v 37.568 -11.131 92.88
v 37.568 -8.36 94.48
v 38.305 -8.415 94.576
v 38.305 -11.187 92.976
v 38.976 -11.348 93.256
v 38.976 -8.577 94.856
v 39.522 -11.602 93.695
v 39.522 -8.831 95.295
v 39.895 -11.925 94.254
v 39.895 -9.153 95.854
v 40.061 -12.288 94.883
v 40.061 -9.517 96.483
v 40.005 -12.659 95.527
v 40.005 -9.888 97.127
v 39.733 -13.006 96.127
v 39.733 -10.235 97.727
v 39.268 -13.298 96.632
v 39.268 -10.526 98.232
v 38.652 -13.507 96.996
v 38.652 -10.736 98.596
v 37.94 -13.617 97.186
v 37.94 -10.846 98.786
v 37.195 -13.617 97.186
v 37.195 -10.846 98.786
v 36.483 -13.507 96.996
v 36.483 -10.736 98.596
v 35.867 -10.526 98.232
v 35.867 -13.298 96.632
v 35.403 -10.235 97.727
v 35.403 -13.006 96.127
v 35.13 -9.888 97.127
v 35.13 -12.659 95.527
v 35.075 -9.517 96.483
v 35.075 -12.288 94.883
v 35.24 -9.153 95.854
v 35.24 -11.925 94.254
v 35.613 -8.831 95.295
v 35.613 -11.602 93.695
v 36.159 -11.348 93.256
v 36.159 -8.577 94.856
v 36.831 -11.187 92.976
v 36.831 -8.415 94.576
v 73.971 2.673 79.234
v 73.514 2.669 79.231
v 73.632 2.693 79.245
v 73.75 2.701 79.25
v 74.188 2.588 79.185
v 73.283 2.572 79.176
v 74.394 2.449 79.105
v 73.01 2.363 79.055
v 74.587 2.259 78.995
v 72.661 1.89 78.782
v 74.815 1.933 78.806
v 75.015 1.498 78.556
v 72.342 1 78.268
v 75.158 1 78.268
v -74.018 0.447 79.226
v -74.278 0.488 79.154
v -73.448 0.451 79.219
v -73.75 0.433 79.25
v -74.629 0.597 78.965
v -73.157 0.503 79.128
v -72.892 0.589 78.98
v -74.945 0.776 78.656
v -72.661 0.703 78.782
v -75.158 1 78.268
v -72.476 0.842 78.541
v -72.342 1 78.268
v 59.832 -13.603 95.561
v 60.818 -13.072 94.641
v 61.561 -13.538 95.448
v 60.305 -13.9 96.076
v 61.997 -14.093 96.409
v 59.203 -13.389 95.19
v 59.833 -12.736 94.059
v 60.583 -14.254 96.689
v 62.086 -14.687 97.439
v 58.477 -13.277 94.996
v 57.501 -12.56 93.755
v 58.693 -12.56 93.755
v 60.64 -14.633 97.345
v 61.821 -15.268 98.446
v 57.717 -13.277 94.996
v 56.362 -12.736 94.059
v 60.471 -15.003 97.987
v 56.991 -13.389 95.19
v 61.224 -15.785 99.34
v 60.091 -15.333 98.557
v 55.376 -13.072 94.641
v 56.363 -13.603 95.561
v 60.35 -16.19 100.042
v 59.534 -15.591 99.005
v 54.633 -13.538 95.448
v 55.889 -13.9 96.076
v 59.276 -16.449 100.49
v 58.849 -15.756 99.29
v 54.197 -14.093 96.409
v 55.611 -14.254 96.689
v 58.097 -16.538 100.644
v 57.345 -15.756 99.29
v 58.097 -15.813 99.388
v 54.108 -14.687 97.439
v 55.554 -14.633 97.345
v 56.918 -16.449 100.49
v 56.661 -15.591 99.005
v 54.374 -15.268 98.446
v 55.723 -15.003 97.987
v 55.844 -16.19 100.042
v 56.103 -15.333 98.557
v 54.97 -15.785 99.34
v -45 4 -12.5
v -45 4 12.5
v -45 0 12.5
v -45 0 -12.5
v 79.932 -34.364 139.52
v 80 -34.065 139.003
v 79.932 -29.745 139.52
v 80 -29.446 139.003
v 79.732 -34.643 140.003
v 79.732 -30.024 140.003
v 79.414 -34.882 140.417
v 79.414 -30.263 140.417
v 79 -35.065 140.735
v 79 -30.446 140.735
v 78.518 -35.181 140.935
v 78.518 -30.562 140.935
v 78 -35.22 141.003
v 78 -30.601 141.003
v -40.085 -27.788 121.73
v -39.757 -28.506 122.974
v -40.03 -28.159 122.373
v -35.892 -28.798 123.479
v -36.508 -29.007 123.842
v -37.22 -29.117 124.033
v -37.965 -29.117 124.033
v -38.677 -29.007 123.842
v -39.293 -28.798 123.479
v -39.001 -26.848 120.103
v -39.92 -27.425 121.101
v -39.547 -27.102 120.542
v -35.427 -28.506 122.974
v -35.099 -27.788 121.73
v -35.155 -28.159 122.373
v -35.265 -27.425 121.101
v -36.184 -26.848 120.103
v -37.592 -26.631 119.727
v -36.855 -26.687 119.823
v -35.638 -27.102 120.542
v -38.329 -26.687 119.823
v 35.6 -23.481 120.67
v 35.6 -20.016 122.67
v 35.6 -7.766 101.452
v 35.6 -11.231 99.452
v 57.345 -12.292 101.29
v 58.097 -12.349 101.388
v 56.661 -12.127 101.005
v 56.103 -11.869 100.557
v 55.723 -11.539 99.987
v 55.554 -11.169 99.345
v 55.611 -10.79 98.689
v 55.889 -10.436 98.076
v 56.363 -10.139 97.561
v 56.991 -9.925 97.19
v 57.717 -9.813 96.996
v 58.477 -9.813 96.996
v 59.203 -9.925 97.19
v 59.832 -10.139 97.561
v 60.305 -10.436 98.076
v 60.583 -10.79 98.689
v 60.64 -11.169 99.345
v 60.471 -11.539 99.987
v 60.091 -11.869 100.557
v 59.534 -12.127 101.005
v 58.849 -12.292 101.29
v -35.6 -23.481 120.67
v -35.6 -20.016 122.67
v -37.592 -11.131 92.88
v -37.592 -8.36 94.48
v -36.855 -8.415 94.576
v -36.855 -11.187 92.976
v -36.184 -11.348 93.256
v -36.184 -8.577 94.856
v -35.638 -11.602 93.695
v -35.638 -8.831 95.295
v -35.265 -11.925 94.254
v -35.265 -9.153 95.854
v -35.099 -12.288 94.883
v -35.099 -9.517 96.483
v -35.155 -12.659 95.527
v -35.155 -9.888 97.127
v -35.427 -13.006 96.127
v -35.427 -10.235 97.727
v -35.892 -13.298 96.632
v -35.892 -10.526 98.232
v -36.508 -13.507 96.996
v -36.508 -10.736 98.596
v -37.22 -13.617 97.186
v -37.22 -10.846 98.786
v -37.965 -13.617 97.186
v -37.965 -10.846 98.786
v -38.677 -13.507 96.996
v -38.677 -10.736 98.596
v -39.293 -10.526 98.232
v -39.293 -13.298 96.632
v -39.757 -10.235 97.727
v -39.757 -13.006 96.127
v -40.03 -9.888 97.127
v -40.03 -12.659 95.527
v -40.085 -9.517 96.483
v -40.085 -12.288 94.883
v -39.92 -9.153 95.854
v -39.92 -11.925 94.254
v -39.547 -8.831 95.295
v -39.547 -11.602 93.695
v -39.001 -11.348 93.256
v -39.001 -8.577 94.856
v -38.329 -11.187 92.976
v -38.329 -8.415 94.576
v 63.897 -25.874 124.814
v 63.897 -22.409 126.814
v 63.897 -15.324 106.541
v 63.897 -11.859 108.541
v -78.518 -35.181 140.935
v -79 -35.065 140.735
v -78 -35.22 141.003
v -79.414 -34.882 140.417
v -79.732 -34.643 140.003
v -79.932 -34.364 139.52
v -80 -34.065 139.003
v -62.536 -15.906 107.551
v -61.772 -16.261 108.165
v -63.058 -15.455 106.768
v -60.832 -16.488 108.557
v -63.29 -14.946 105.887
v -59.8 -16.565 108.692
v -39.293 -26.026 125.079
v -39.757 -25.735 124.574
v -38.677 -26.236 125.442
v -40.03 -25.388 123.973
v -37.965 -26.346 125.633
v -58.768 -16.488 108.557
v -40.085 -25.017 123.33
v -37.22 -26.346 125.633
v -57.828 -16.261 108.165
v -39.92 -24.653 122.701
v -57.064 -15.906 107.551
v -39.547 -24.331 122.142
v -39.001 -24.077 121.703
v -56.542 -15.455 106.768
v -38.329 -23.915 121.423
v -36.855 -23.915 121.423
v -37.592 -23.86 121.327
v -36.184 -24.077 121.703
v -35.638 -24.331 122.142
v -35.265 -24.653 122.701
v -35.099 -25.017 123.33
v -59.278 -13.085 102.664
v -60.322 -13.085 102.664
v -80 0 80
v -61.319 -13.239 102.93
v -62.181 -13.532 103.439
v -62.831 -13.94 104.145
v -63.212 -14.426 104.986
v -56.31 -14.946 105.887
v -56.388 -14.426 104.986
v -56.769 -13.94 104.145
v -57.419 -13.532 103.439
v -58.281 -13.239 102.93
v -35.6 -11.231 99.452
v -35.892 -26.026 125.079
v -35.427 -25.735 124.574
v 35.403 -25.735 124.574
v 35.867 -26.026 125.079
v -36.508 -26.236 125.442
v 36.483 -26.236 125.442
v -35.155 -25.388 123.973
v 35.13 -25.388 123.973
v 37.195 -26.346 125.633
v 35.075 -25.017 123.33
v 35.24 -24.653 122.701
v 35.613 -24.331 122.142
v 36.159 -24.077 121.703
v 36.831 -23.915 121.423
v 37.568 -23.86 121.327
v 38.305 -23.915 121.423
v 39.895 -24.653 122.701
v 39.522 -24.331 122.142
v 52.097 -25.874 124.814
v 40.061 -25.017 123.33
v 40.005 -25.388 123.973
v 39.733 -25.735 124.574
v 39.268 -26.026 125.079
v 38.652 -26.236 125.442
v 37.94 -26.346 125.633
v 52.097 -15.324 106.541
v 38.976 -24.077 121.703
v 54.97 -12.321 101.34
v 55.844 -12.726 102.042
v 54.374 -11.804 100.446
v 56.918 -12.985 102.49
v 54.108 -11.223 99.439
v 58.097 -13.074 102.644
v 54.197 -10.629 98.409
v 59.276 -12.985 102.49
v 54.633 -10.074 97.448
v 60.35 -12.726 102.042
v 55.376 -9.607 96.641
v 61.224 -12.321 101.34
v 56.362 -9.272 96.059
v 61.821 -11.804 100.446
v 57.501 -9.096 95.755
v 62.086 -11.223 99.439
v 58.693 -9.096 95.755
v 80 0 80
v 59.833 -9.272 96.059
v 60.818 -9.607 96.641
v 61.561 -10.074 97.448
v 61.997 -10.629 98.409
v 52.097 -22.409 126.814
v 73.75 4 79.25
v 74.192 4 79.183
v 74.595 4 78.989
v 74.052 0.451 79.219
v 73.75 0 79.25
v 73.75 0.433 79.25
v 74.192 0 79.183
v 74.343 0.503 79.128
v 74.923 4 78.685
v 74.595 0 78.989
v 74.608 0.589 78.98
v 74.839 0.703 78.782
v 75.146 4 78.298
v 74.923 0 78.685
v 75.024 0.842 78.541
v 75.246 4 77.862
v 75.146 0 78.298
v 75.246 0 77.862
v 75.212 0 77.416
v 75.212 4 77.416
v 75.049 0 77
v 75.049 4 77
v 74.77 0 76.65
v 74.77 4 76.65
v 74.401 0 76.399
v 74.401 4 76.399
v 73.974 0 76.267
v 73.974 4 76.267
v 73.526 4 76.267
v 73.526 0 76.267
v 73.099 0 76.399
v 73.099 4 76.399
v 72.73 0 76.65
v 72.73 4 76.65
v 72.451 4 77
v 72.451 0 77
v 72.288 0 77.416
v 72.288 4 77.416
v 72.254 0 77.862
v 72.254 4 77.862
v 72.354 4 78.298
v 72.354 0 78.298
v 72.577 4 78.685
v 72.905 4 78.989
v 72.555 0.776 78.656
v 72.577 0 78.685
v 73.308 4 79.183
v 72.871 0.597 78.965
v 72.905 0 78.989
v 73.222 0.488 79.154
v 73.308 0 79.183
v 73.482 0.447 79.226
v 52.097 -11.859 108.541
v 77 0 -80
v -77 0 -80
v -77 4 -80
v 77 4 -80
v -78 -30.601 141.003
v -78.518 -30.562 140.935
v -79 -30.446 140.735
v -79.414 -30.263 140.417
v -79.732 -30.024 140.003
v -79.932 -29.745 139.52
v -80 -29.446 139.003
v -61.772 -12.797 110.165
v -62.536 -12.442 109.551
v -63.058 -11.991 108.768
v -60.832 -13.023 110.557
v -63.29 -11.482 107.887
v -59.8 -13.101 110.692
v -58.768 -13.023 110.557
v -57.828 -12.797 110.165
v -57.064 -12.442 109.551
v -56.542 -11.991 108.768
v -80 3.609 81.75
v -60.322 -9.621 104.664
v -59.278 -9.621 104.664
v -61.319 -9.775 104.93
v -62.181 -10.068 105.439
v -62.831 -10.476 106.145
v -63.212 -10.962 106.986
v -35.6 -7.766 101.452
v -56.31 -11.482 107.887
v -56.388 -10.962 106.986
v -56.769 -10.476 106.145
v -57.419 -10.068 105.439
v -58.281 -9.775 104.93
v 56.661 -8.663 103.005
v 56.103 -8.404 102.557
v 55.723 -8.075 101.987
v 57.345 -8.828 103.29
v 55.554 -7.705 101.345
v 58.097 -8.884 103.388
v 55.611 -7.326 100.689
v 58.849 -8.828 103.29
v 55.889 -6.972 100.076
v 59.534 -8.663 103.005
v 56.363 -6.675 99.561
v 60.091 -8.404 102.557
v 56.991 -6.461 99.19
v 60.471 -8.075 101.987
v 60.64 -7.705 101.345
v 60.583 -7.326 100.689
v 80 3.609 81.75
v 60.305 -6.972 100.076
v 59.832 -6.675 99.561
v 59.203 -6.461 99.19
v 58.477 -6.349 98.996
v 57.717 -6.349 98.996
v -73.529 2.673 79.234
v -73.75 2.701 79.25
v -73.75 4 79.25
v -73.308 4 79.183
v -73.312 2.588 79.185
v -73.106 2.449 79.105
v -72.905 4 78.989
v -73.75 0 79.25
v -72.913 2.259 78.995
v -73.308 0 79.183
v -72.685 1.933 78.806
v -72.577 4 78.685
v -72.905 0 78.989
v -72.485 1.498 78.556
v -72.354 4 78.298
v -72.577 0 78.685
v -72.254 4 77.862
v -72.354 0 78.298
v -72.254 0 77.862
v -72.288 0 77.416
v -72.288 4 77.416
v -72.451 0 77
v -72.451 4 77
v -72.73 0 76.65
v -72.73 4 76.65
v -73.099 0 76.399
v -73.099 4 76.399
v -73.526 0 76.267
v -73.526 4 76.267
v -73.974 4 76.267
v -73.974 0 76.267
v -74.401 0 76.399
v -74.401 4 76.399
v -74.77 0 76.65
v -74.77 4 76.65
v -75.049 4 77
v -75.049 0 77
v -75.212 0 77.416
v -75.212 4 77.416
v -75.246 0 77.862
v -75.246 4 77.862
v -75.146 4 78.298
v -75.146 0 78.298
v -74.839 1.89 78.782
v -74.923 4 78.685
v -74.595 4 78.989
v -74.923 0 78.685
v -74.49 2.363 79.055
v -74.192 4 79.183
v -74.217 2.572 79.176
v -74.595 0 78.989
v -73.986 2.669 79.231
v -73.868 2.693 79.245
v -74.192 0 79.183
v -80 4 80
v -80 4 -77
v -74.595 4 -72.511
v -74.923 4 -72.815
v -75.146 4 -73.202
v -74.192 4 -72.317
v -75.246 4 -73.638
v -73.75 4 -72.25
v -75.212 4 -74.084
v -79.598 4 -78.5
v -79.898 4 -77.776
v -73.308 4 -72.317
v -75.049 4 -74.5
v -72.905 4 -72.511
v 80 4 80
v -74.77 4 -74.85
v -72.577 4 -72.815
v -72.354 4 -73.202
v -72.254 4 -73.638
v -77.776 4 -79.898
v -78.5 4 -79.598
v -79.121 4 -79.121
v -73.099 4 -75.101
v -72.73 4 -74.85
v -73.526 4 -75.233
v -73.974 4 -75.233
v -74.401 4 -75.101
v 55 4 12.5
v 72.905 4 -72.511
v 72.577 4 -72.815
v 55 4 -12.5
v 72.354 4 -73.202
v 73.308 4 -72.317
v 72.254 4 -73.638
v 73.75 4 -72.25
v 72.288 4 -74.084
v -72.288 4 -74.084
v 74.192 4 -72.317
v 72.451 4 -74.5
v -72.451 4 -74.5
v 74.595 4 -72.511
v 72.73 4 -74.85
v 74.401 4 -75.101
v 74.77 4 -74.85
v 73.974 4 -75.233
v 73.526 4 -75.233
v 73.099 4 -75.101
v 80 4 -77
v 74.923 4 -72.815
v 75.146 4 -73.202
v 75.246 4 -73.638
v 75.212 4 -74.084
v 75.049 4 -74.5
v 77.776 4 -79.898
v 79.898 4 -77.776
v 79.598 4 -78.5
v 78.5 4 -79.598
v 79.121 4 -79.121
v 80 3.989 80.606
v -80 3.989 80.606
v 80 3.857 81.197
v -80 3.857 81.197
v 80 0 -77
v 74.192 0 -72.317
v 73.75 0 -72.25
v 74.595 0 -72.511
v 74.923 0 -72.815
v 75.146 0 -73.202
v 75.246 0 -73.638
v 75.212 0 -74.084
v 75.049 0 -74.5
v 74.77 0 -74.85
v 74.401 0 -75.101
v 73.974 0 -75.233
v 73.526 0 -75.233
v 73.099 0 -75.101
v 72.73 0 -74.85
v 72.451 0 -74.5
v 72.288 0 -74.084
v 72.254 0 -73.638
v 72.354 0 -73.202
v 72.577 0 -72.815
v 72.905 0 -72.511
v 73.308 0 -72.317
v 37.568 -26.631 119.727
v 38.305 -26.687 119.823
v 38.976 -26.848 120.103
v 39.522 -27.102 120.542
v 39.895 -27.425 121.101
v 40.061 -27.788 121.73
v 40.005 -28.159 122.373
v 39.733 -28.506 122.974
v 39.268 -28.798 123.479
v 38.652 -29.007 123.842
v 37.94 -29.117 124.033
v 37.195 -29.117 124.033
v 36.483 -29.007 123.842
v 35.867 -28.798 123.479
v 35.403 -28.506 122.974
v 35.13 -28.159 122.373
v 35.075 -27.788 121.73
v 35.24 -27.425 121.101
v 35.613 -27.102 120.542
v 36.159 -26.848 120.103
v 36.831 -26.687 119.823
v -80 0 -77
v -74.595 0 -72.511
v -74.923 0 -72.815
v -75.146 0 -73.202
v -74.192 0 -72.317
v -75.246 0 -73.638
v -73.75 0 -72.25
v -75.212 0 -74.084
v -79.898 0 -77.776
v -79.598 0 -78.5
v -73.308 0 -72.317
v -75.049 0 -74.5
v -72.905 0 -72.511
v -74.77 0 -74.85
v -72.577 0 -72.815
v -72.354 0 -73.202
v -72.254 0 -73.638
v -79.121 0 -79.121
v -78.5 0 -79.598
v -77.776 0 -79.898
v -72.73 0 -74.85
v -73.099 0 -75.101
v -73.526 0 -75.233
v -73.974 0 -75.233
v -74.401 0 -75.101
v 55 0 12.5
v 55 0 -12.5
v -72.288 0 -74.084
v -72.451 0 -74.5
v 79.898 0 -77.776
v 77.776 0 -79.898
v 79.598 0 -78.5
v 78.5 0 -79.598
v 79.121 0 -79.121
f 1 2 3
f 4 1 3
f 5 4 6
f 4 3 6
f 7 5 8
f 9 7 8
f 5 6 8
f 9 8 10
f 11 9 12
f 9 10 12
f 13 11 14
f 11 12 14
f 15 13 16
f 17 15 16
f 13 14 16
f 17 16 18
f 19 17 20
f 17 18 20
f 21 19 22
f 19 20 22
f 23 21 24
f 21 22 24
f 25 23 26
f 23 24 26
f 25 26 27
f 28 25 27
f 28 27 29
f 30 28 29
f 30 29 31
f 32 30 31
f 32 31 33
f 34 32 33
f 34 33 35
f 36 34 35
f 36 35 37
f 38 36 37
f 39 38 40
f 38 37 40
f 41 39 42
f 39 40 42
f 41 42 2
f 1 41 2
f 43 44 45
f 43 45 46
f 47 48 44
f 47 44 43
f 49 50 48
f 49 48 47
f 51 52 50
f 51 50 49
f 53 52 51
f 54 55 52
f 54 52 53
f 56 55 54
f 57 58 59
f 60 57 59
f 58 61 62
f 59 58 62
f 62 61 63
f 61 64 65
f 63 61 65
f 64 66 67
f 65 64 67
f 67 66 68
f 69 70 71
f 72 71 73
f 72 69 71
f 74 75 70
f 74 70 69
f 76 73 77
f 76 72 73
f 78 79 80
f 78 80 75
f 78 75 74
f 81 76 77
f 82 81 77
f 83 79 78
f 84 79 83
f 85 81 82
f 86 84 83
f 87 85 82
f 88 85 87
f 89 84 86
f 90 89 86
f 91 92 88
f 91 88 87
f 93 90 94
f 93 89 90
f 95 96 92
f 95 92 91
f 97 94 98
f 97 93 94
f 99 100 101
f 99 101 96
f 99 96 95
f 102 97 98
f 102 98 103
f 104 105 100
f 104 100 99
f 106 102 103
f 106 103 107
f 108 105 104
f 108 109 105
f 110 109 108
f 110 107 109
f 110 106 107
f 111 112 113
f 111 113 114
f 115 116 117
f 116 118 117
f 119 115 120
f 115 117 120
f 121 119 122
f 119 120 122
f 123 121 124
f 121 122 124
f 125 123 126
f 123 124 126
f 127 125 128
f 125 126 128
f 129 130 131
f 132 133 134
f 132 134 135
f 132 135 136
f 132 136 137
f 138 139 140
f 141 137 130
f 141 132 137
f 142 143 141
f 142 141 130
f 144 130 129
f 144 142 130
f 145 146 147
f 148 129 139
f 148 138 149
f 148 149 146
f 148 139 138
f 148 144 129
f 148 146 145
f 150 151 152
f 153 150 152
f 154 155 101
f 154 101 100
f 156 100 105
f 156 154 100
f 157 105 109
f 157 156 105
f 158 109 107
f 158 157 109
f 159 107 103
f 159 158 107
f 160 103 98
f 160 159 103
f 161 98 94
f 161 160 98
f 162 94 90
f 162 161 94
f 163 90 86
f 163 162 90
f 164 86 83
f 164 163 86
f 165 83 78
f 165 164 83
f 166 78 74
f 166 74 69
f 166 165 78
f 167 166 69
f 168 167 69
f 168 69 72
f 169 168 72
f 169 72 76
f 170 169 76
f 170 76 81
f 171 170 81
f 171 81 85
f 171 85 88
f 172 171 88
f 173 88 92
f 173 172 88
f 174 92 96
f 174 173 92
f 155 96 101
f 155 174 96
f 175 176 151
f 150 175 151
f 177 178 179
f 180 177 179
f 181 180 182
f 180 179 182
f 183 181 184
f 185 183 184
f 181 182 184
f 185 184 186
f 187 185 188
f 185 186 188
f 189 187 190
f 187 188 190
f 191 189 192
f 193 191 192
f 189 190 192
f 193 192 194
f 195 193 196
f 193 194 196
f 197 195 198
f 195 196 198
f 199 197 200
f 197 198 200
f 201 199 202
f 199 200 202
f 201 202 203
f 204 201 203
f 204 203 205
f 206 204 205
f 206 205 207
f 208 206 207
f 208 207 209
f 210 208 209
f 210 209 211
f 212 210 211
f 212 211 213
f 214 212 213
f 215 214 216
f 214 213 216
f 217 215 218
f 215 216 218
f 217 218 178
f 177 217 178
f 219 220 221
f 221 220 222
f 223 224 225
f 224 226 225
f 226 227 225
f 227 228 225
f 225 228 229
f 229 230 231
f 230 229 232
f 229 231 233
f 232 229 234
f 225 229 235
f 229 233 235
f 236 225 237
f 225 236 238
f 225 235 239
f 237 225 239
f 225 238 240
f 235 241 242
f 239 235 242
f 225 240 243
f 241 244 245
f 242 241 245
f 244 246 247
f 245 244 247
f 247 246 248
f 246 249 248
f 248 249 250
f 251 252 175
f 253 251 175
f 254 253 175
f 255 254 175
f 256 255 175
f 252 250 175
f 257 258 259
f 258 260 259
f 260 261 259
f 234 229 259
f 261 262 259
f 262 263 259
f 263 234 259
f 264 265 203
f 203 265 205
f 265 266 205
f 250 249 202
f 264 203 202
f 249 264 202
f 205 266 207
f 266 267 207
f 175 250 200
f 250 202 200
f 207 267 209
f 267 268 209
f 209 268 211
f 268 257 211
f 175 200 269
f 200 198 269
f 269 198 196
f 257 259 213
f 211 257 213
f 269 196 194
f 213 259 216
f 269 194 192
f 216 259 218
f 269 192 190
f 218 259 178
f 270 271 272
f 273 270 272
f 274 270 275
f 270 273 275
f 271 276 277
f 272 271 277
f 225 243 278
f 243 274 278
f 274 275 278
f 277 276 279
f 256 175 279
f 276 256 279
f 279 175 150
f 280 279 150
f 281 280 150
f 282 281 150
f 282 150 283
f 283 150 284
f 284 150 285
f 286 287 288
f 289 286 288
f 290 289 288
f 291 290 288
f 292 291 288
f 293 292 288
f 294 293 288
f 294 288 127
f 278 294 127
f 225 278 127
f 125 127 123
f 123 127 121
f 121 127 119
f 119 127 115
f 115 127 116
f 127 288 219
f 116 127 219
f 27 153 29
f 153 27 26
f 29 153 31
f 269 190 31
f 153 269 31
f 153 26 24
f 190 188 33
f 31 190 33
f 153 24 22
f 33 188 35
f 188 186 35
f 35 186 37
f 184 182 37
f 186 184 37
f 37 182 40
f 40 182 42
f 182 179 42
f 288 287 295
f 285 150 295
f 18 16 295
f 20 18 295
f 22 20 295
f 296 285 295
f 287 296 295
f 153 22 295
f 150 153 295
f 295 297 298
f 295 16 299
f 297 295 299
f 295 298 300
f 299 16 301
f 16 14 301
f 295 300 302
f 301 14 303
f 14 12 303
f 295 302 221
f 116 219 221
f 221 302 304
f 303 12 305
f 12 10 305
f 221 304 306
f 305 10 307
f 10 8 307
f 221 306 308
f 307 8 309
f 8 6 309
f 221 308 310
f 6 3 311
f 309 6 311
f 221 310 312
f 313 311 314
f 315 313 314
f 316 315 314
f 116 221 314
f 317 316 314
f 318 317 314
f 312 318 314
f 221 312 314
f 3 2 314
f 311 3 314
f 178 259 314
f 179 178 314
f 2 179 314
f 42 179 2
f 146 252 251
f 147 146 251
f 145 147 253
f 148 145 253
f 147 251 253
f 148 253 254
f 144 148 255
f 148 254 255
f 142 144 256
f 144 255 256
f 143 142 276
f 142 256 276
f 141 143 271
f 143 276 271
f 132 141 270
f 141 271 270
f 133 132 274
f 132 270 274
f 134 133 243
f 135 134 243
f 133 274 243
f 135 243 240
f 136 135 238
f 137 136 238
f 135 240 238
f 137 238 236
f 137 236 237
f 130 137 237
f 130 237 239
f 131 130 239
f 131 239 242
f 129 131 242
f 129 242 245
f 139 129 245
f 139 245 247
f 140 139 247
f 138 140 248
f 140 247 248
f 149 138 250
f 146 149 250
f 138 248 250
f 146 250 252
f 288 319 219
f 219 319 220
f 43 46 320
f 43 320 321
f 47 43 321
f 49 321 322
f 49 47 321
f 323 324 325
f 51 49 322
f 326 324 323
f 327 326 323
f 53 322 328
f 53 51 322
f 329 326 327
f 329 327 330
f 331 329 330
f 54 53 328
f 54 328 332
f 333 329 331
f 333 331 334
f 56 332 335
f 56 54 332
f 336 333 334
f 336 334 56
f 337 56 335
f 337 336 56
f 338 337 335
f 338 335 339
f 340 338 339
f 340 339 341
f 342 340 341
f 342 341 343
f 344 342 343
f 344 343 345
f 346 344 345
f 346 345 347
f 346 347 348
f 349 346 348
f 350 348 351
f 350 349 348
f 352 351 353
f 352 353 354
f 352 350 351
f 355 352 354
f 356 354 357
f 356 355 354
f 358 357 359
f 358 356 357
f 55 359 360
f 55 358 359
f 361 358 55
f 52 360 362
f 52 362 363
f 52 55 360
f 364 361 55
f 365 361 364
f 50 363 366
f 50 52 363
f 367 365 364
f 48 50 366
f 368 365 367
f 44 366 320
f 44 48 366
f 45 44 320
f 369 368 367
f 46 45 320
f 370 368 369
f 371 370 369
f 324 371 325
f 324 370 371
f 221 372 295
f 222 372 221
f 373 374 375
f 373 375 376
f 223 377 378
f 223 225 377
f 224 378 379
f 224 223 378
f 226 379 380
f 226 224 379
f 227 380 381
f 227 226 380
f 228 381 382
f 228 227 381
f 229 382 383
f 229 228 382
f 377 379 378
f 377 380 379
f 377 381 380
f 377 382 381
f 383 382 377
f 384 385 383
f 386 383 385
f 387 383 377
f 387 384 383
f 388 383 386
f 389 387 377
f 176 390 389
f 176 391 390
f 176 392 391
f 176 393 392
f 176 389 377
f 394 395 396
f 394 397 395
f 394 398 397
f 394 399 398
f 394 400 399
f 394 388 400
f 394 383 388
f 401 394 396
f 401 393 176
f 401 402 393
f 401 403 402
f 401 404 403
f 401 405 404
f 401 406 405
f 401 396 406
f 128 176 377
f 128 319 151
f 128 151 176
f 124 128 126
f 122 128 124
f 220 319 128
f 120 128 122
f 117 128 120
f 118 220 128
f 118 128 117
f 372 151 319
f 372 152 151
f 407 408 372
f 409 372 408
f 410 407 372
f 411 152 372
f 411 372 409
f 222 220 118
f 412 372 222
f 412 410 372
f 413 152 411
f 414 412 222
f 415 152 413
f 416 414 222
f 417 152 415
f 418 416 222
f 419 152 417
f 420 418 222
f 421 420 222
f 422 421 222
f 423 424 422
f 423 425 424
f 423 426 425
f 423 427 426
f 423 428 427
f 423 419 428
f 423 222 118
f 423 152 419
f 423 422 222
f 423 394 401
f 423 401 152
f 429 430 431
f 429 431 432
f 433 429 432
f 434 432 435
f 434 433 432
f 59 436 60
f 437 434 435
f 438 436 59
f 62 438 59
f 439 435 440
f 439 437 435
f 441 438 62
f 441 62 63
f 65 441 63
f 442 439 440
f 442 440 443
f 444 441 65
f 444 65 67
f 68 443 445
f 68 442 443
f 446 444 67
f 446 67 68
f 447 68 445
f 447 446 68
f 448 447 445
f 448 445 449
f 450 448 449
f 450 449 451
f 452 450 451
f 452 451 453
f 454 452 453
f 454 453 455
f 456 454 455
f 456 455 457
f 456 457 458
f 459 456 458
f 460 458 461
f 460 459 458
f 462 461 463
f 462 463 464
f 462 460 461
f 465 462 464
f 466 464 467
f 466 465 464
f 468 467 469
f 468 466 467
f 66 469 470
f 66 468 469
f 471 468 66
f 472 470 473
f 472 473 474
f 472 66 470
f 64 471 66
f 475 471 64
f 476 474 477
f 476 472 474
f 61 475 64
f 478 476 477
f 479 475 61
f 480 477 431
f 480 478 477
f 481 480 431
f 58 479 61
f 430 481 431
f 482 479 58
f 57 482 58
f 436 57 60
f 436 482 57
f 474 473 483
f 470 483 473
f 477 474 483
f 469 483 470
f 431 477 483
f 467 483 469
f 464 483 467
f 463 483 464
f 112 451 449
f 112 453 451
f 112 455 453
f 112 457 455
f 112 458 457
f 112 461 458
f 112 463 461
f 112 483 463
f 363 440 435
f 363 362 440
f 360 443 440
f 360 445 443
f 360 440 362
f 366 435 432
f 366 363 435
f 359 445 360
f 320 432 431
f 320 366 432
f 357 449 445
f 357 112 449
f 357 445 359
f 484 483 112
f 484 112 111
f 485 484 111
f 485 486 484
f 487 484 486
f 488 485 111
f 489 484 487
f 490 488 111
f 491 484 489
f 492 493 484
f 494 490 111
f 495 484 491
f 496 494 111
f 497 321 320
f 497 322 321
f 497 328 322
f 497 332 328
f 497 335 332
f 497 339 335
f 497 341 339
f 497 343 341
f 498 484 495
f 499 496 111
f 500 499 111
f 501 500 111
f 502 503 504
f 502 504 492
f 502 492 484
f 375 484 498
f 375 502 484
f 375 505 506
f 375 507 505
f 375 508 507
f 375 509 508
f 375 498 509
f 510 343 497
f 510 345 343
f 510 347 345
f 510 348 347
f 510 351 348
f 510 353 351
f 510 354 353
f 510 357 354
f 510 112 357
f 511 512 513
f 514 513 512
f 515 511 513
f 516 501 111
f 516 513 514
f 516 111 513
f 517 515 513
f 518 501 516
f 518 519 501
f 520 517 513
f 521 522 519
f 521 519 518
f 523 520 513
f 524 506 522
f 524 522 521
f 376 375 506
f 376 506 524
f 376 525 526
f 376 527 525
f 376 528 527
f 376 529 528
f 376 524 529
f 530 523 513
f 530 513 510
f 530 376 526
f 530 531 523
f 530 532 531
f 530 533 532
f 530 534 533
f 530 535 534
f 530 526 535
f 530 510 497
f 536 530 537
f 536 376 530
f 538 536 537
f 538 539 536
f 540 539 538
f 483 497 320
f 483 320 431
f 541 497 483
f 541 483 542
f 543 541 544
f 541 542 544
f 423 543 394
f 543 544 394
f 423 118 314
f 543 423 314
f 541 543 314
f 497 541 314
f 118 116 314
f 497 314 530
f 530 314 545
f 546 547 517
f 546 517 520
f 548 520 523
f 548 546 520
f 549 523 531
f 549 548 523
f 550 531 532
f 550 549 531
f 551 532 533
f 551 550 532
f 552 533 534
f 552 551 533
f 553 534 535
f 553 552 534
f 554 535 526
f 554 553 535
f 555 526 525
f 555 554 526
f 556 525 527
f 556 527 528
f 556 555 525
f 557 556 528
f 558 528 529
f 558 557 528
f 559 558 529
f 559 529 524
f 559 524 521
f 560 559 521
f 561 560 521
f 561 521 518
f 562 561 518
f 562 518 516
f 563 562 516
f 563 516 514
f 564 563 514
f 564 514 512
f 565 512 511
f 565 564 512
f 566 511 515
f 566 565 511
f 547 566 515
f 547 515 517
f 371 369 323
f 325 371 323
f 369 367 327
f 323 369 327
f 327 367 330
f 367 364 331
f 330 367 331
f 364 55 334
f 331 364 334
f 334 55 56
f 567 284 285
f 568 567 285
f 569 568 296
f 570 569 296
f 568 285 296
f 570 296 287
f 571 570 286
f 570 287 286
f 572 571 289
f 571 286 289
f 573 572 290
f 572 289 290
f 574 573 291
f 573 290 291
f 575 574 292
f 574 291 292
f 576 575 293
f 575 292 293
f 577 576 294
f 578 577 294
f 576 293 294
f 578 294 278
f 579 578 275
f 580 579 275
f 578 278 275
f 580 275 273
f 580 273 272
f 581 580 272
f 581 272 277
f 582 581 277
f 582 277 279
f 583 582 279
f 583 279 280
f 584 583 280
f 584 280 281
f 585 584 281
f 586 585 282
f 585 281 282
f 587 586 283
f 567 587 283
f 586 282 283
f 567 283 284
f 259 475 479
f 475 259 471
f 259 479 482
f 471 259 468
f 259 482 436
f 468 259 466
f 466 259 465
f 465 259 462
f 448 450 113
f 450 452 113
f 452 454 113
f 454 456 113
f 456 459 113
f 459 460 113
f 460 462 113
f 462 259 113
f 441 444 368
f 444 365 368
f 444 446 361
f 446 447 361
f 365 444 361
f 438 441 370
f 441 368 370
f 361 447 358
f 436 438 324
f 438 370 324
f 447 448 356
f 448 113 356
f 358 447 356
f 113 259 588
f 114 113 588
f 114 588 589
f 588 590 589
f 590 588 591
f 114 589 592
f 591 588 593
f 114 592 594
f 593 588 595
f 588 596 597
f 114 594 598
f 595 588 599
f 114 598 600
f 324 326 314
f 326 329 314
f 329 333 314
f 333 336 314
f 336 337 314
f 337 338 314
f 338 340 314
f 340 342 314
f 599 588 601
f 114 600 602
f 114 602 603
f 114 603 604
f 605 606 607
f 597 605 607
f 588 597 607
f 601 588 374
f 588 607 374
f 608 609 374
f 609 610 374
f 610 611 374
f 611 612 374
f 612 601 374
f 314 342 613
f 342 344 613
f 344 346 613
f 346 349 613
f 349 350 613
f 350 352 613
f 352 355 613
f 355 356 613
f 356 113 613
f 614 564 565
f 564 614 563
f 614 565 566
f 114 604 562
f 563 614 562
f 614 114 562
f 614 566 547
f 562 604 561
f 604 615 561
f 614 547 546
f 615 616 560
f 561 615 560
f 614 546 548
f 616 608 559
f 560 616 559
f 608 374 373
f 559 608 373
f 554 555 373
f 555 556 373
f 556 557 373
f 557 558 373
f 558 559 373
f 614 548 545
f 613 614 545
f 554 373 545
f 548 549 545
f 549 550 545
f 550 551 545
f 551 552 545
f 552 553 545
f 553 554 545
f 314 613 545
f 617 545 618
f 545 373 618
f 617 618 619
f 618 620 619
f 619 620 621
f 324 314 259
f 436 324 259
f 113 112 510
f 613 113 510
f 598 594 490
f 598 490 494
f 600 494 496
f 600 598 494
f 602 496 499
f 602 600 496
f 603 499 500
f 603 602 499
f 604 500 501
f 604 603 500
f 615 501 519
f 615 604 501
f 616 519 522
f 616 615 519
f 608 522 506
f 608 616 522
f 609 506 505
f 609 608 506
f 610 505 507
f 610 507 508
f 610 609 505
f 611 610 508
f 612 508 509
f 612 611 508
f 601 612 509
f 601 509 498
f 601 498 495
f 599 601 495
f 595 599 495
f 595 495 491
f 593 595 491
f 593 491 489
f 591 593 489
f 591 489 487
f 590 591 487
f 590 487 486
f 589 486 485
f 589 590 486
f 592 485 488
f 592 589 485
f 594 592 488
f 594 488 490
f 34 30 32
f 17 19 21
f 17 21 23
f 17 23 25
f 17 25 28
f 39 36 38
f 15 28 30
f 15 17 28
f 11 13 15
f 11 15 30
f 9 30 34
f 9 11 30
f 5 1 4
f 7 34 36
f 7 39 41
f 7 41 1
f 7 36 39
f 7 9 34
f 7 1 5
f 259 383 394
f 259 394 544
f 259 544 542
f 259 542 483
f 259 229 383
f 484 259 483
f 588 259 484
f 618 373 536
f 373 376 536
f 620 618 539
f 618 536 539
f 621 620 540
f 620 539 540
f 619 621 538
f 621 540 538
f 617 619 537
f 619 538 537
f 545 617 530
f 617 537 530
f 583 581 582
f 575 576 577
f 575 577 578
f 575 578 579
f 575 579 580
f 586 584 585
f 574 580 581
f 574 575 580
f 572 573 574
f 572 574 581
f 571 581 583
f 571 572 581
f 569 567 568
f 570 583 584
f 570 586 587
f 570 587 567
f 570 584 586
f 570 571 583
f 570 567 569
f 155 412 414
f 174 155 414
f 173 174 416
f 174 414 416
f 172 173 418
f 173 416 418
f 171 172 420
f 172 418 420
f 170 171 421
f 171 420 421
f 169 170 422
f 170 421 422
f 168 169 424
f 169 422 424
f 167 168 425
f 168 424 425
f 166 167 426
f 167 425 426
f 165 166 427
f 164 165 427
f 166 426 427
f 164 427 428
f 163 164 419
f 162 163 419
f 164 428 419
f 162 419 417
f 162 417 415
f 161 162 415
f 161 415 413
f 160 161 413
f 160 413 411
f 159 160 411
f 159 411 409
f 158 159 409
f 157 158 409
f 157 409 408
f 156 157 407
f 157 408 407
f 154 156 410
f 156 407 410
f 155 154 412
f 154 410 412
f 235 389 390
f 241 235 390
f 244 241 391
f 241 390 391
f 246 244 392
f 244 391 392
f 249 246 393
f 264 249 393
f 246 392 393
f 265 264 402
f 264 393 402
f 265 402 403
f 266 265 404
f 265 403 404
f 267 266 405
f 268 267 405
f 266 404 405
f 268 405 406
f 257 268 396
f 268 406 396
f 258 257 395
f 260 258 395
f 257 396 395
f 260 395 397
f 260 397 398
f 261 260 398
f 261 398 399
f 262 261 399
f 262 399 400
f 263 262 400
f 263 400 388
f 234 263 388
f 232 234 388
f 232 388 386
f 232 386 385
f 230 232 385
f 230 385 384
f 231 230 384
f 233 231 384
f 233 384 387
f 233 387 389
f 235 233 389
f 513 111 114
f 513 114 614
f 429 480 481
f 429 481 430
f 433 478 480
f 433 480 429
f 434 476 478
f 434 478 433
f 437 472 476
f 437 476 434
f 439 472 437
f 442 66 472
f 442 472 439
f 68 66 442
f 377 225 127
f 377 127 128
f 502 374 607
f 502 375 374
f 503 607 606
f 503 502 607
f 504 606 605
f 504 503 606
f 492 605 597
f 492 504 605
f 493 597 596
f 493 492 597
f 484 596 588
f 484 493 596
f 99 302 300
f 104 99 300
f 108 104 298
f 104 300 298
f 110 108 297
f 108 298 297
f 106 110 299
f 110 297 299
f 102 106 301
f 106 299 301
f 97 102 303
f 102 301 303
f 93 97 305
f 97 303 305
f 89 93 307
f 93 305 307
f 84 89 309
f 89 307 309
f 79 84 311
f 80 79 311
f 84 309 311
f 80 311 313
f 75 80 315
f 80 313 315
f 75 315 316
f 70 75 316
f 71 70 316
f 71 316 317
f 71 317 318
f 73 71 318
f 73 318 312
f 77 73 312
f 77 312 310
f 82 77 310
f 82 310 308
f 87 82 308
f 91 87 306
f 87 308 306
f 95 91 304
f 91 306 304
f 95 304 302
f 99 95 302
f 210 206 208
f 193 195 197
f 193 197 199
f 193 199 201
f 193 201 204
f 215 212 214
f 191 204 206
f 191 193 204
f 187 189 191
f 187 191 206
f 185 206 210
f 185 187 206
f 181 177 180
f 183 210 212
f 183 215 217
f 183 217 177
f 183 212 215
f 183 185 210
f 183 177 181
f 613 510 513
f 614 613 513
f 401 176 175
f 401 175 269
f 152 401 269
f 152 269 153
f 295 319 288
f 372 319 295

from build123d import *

# Parameters (mm, degrees)
SKETCH1_W           = 160
SKETCH1_H           = 160
SKETCH1_R           = 1.5
BOSS_EXTRUDE1_DEPTH = 4
SKETCH5_W           = 160
SKETCH5_H           = 75
BOSS_EXTRUDE4_DEPTH = 4
FILLET1_R           = 3
FILLET2_R           = 3
FILLET3_R           = 3
CUT_EXTRUDE6_DEPTH  = 165
FILLET8_R           = 2
FILLET9_R           = 2
SKETCH13_W          = 100
SKETCH13_H          = 25
CUT_EXTRUDE7_DEPTH  = 10
SKETCH17_W          = 71.2
SKETCH17_H          = 24.5
CUT_EXTRUDE10_DEPTH = 10
SKETCH20_R          = 2.5
BOSS_EXTRUDE5_DEPTH = 3.2
SKETCH21_W          = 11.8
SKETCH21_H          = 21.1
CUT_EXTRUDE11_DEPTH = 5
SKETCH23_R          = 2.55
CUT_EXTRUDE12_DEPTH = 4
SKETCH24_R          = 4
BOSS_EXTRUDE6_DEPTH = 4
SKETCH25_R          = 2.55
CUT_EXTRUDE15_DEPTH = 4
SKETCH26_R          = 3.5
CUT_EXTRUDE16_DEPTH = 10


with BuildPart() as part:
    # Sketch1 → Boss-Extrude1 (new body)
    with BuildSketch(Plane(origin=(0, 0, 0), x_dir=(1, 0, 0), z_dir=(0, 1, 0))):
        Rectangle(SKETCH1_W, SKETCH1_H)
        with Locations(Location((-73.75, 73.75, 0), (0, 0, 270))):
            Circle(SKETCH1_R, mode=Mode.SUBTRACT)
        with Locations(Location((73.75, 73.75, 0), (0, 0, 270))):
            Circle(SKETCH1_R, mode=Mode.SUBTRACT)
        with Locations(Location((-73.75, -77.75, 0), (0, 0, 270))):
            Circle(SKETCH1_R, mode=Mode.SUBTRACT)
        with Locations(Location((73.75, -77.75, 0), (0, 0, 270))):
            Circle(SKETCH1_R, mode=Mode.SUBTRACT)
    extrude(amount=BOSS_EXTRUDE1_DEPTH)

    # Sketch5 → Boss-Extrude4 (add)
    with BuildSketch(Plane(origin=(0, 34.641016151, 20), x_dir=(1, 0, 0), z_dir=(0, 0.8660254037844346, 0.5000000000000071))):
        with Locations((0, -104.782032303)):
            Rectangle(SKETCH5_W, SKETCH5_H)
    extrude(amount=BOSS_EXTRUDE4_DEPTH)

    # Fillet1
    # the kernel refuses this fillet: 3 mm, written as the material it takes off along each edge
    with BuildSketch(Plane(origin=(-84.277998386, 4.464101615, 80.267949192), x_dir=(0, -0.8660254037849107, -0.4999999999991824), z_dir=(1, 0, 0))) as fillet1_piece_1:
        with BuildLine():
            CenterArc((3, -1.711199354), FILLET1_R, 145.221891332, 34.778108668)
            Line((0, -1.711199354), (-0.06, -1.711199354))
            Line((-0.06, -1.711199354), (-0.06, 0))
            Line((-0.06, 0), (0, 0.06))
            ThreePointArc((0, 0.06), (0.267949192, 0.06), (0.486616353, 0.034223987))
            Line((0.486616353, 0.034223987), (0.535898385, 0))
        make_face()
    extrude(amount=168.555996772, mode=Mode.SUBTRACT)

    # Fillet2
    fillet2_edges = [part.edges().sort_by_distance(p)[0] for p in [
        (80, 2, -80),
    ]]
    fillet(fillet2_edges, radius=FILLET2_R)

    # Fillet3
    fillet3_edges = [part.edges().sort_by_distance(p)[0] for p in [
        (-80, 2, -80),
    ]]
    fillet(fillet3_edges, radius=FILLET3_R)

    # Sketch12 → Cut-Extrude6 (cut)
    with BuildSketch(Plane(origin=(80, 0, 0), x_dir=(0, 0, -1), z_dir=(1, 0, 0))):
        Polygon((-145.219854476, -33.035898385), (-143.219854476, -36.5), (-141.002829443, -35.22), (-141.002829443, -30.601197846), align=None)
    extrude(amount=-CUT_EXTRUDE6_DEPTH, mode=Mode.SUBTRACT)

    # Fillet8
    fillet8_edges = [part.edges().sort_by_distance(p)[0] for p in [
        (80, -32.910598923, 141.002829443),
    ]]
    fillet(fillet8_edges, radius=FILLET8_R)

    # Fillet9
    fillet9_edges = [part.edges().sort_by_distance(p)[0] for p in [
        (-80, -32.910598923, 141.002829443),
    ]]
    fillet(fillet9_edges, radius=FILLET9_R)

    # Sketch13 → Cut-Extrude7 (cut)
    with BuildSketch(Plane(origin=(0, 4, 0), x_dir=(1, 0, 0), z_dir=(0, 1, 0))):
        with Locations((5, 0)):
            Rectangle(SKETCH13_W, SKETCH13_H)
    extrude(amount=-CUT_EXTRUDE7_DEPTH, mode=Mode.SUBTRACT)

    # Sketch17 → Cut-Extrude10 (cut)
    with BuildSketch(Plane(origin=(0, 38.105117767, 22), x_dir=(1, 0, 0), z_dir=(0, 0.8660254037844344, 0.5000000000000073))):
        with Locations((0, -103.993231657)):
            Rectangle(SKETCH17_W, SKETCH17_H)
    extrude(amount=-CUT_EXTRUDE10_DEPTH, mode=Mode.SUBTRACT)

    # Sketch20 → Boss-Extrude5 (add)
    with BuildSketch(Plane(origin=(0, 34.641016151, 20), x_dir=(1, 0, 0), z_dir=(0, -0.8660254037844344, -0.5000000000000073))):
        with Locations(Location((-37.592365001, 119.501924995, 0), (0, 0, 270))):
            Circle(SKETCH20_R)
        with Locations(Location((37.567634999, 88.501924995, 0), (0, 0, 270))):
            Circle(SKETCH20_R)
        with Locations(Location((37.567634999, 119.501924995, 0), (0, 0, 270))):
            Circle(SKETCH20_R)
        with Locations(Location((-37.592365001, 88.501924995, 0), (0, 0, 270))):
            Circle(SKETCH20_R)
    extrude(amount=BOSS_EXTRUDE5_DEPTH)

    # Sketch21 → Cut-Extrude11 (cut)
    with BuildSketch(Plane(origin=(0, 38.105117767, 22), x_dir=(1, 0, 0), z_dir=(0, 0.8660254037844344, 0.5000000000000073))):
        with Locations((57.997068985, -110.479162625)):
            Rectangle(SKETCH21_W, SKETCH21_H)
    extrude(amount=-CUT_EXTRUDE11_DEPTH, mode=Mode.SUBTRACT)

    # Sketch23 → Cut-Extrude12 (cut)
    with BuildSketch(Plane(origin=(0, 38.105117767, 22), x_dir=(1, 0, 0), z_dir=(0, 0.8660254037844345, 0.5000000000000074))):
        with Locations(Location((58.097068985, -91.429162625, 0), (0, 0, 270))):
            Circle(SKETCH23_R)
    extrude(amount=-CUT_EXTRUDE12_DEPTH, mode=Mode.SUBTRACT)

    # Sketch24 → Boss-Extrude6 (add)
    with BuildSketch(Plane(origin=(0, 34.641016151, 20), x_dir=(1, 0, 0), z_dir=(0, -0.8660254037844344, -0.5000000000000073))):
        with Locations(Location((58.097068985, 91.429162625, 0), (0, 0, 90))):
            Circle(SKETCH24_R)
    extrude(amount=BOSS_EXTRUDE6_DEPTH)

    # Sketch25 → Cut-Extrude15 (cut)
    with BuildSketch(Plane(origin=(0, 34.641016151, 20), x_dir=(1, 0, 0), z_dir=(0, -0.8660254037844345, -0.5000000000000074))):
        with Locations(Location((58.097068985, 91.429162625, 0), (0, 0, 90))):
            Circle(SKETCH25_R)
    extrude(amount=CUT_EXTRUDE15_DEPTH, mode=Mode.SUBTRACT)

    # Sketch26 → Cut-Extrude16 (cut)
    with BuildSketch(Plane(origin=(0, 38.105117767, 22), x_dir=(1, 0, 0), z_dir=(0, 0.8660254037844345, 0.5000000000000074))):
        with Locations(Location((-59.8, -98.912631226, 0), (0, 0, 270))):
            Circle(SKETCH26_R)
    extrude(amount=-CUT_EXTRUDE16_DEPTH, mode=Mode.SUBTRACT)


solid = part.part
